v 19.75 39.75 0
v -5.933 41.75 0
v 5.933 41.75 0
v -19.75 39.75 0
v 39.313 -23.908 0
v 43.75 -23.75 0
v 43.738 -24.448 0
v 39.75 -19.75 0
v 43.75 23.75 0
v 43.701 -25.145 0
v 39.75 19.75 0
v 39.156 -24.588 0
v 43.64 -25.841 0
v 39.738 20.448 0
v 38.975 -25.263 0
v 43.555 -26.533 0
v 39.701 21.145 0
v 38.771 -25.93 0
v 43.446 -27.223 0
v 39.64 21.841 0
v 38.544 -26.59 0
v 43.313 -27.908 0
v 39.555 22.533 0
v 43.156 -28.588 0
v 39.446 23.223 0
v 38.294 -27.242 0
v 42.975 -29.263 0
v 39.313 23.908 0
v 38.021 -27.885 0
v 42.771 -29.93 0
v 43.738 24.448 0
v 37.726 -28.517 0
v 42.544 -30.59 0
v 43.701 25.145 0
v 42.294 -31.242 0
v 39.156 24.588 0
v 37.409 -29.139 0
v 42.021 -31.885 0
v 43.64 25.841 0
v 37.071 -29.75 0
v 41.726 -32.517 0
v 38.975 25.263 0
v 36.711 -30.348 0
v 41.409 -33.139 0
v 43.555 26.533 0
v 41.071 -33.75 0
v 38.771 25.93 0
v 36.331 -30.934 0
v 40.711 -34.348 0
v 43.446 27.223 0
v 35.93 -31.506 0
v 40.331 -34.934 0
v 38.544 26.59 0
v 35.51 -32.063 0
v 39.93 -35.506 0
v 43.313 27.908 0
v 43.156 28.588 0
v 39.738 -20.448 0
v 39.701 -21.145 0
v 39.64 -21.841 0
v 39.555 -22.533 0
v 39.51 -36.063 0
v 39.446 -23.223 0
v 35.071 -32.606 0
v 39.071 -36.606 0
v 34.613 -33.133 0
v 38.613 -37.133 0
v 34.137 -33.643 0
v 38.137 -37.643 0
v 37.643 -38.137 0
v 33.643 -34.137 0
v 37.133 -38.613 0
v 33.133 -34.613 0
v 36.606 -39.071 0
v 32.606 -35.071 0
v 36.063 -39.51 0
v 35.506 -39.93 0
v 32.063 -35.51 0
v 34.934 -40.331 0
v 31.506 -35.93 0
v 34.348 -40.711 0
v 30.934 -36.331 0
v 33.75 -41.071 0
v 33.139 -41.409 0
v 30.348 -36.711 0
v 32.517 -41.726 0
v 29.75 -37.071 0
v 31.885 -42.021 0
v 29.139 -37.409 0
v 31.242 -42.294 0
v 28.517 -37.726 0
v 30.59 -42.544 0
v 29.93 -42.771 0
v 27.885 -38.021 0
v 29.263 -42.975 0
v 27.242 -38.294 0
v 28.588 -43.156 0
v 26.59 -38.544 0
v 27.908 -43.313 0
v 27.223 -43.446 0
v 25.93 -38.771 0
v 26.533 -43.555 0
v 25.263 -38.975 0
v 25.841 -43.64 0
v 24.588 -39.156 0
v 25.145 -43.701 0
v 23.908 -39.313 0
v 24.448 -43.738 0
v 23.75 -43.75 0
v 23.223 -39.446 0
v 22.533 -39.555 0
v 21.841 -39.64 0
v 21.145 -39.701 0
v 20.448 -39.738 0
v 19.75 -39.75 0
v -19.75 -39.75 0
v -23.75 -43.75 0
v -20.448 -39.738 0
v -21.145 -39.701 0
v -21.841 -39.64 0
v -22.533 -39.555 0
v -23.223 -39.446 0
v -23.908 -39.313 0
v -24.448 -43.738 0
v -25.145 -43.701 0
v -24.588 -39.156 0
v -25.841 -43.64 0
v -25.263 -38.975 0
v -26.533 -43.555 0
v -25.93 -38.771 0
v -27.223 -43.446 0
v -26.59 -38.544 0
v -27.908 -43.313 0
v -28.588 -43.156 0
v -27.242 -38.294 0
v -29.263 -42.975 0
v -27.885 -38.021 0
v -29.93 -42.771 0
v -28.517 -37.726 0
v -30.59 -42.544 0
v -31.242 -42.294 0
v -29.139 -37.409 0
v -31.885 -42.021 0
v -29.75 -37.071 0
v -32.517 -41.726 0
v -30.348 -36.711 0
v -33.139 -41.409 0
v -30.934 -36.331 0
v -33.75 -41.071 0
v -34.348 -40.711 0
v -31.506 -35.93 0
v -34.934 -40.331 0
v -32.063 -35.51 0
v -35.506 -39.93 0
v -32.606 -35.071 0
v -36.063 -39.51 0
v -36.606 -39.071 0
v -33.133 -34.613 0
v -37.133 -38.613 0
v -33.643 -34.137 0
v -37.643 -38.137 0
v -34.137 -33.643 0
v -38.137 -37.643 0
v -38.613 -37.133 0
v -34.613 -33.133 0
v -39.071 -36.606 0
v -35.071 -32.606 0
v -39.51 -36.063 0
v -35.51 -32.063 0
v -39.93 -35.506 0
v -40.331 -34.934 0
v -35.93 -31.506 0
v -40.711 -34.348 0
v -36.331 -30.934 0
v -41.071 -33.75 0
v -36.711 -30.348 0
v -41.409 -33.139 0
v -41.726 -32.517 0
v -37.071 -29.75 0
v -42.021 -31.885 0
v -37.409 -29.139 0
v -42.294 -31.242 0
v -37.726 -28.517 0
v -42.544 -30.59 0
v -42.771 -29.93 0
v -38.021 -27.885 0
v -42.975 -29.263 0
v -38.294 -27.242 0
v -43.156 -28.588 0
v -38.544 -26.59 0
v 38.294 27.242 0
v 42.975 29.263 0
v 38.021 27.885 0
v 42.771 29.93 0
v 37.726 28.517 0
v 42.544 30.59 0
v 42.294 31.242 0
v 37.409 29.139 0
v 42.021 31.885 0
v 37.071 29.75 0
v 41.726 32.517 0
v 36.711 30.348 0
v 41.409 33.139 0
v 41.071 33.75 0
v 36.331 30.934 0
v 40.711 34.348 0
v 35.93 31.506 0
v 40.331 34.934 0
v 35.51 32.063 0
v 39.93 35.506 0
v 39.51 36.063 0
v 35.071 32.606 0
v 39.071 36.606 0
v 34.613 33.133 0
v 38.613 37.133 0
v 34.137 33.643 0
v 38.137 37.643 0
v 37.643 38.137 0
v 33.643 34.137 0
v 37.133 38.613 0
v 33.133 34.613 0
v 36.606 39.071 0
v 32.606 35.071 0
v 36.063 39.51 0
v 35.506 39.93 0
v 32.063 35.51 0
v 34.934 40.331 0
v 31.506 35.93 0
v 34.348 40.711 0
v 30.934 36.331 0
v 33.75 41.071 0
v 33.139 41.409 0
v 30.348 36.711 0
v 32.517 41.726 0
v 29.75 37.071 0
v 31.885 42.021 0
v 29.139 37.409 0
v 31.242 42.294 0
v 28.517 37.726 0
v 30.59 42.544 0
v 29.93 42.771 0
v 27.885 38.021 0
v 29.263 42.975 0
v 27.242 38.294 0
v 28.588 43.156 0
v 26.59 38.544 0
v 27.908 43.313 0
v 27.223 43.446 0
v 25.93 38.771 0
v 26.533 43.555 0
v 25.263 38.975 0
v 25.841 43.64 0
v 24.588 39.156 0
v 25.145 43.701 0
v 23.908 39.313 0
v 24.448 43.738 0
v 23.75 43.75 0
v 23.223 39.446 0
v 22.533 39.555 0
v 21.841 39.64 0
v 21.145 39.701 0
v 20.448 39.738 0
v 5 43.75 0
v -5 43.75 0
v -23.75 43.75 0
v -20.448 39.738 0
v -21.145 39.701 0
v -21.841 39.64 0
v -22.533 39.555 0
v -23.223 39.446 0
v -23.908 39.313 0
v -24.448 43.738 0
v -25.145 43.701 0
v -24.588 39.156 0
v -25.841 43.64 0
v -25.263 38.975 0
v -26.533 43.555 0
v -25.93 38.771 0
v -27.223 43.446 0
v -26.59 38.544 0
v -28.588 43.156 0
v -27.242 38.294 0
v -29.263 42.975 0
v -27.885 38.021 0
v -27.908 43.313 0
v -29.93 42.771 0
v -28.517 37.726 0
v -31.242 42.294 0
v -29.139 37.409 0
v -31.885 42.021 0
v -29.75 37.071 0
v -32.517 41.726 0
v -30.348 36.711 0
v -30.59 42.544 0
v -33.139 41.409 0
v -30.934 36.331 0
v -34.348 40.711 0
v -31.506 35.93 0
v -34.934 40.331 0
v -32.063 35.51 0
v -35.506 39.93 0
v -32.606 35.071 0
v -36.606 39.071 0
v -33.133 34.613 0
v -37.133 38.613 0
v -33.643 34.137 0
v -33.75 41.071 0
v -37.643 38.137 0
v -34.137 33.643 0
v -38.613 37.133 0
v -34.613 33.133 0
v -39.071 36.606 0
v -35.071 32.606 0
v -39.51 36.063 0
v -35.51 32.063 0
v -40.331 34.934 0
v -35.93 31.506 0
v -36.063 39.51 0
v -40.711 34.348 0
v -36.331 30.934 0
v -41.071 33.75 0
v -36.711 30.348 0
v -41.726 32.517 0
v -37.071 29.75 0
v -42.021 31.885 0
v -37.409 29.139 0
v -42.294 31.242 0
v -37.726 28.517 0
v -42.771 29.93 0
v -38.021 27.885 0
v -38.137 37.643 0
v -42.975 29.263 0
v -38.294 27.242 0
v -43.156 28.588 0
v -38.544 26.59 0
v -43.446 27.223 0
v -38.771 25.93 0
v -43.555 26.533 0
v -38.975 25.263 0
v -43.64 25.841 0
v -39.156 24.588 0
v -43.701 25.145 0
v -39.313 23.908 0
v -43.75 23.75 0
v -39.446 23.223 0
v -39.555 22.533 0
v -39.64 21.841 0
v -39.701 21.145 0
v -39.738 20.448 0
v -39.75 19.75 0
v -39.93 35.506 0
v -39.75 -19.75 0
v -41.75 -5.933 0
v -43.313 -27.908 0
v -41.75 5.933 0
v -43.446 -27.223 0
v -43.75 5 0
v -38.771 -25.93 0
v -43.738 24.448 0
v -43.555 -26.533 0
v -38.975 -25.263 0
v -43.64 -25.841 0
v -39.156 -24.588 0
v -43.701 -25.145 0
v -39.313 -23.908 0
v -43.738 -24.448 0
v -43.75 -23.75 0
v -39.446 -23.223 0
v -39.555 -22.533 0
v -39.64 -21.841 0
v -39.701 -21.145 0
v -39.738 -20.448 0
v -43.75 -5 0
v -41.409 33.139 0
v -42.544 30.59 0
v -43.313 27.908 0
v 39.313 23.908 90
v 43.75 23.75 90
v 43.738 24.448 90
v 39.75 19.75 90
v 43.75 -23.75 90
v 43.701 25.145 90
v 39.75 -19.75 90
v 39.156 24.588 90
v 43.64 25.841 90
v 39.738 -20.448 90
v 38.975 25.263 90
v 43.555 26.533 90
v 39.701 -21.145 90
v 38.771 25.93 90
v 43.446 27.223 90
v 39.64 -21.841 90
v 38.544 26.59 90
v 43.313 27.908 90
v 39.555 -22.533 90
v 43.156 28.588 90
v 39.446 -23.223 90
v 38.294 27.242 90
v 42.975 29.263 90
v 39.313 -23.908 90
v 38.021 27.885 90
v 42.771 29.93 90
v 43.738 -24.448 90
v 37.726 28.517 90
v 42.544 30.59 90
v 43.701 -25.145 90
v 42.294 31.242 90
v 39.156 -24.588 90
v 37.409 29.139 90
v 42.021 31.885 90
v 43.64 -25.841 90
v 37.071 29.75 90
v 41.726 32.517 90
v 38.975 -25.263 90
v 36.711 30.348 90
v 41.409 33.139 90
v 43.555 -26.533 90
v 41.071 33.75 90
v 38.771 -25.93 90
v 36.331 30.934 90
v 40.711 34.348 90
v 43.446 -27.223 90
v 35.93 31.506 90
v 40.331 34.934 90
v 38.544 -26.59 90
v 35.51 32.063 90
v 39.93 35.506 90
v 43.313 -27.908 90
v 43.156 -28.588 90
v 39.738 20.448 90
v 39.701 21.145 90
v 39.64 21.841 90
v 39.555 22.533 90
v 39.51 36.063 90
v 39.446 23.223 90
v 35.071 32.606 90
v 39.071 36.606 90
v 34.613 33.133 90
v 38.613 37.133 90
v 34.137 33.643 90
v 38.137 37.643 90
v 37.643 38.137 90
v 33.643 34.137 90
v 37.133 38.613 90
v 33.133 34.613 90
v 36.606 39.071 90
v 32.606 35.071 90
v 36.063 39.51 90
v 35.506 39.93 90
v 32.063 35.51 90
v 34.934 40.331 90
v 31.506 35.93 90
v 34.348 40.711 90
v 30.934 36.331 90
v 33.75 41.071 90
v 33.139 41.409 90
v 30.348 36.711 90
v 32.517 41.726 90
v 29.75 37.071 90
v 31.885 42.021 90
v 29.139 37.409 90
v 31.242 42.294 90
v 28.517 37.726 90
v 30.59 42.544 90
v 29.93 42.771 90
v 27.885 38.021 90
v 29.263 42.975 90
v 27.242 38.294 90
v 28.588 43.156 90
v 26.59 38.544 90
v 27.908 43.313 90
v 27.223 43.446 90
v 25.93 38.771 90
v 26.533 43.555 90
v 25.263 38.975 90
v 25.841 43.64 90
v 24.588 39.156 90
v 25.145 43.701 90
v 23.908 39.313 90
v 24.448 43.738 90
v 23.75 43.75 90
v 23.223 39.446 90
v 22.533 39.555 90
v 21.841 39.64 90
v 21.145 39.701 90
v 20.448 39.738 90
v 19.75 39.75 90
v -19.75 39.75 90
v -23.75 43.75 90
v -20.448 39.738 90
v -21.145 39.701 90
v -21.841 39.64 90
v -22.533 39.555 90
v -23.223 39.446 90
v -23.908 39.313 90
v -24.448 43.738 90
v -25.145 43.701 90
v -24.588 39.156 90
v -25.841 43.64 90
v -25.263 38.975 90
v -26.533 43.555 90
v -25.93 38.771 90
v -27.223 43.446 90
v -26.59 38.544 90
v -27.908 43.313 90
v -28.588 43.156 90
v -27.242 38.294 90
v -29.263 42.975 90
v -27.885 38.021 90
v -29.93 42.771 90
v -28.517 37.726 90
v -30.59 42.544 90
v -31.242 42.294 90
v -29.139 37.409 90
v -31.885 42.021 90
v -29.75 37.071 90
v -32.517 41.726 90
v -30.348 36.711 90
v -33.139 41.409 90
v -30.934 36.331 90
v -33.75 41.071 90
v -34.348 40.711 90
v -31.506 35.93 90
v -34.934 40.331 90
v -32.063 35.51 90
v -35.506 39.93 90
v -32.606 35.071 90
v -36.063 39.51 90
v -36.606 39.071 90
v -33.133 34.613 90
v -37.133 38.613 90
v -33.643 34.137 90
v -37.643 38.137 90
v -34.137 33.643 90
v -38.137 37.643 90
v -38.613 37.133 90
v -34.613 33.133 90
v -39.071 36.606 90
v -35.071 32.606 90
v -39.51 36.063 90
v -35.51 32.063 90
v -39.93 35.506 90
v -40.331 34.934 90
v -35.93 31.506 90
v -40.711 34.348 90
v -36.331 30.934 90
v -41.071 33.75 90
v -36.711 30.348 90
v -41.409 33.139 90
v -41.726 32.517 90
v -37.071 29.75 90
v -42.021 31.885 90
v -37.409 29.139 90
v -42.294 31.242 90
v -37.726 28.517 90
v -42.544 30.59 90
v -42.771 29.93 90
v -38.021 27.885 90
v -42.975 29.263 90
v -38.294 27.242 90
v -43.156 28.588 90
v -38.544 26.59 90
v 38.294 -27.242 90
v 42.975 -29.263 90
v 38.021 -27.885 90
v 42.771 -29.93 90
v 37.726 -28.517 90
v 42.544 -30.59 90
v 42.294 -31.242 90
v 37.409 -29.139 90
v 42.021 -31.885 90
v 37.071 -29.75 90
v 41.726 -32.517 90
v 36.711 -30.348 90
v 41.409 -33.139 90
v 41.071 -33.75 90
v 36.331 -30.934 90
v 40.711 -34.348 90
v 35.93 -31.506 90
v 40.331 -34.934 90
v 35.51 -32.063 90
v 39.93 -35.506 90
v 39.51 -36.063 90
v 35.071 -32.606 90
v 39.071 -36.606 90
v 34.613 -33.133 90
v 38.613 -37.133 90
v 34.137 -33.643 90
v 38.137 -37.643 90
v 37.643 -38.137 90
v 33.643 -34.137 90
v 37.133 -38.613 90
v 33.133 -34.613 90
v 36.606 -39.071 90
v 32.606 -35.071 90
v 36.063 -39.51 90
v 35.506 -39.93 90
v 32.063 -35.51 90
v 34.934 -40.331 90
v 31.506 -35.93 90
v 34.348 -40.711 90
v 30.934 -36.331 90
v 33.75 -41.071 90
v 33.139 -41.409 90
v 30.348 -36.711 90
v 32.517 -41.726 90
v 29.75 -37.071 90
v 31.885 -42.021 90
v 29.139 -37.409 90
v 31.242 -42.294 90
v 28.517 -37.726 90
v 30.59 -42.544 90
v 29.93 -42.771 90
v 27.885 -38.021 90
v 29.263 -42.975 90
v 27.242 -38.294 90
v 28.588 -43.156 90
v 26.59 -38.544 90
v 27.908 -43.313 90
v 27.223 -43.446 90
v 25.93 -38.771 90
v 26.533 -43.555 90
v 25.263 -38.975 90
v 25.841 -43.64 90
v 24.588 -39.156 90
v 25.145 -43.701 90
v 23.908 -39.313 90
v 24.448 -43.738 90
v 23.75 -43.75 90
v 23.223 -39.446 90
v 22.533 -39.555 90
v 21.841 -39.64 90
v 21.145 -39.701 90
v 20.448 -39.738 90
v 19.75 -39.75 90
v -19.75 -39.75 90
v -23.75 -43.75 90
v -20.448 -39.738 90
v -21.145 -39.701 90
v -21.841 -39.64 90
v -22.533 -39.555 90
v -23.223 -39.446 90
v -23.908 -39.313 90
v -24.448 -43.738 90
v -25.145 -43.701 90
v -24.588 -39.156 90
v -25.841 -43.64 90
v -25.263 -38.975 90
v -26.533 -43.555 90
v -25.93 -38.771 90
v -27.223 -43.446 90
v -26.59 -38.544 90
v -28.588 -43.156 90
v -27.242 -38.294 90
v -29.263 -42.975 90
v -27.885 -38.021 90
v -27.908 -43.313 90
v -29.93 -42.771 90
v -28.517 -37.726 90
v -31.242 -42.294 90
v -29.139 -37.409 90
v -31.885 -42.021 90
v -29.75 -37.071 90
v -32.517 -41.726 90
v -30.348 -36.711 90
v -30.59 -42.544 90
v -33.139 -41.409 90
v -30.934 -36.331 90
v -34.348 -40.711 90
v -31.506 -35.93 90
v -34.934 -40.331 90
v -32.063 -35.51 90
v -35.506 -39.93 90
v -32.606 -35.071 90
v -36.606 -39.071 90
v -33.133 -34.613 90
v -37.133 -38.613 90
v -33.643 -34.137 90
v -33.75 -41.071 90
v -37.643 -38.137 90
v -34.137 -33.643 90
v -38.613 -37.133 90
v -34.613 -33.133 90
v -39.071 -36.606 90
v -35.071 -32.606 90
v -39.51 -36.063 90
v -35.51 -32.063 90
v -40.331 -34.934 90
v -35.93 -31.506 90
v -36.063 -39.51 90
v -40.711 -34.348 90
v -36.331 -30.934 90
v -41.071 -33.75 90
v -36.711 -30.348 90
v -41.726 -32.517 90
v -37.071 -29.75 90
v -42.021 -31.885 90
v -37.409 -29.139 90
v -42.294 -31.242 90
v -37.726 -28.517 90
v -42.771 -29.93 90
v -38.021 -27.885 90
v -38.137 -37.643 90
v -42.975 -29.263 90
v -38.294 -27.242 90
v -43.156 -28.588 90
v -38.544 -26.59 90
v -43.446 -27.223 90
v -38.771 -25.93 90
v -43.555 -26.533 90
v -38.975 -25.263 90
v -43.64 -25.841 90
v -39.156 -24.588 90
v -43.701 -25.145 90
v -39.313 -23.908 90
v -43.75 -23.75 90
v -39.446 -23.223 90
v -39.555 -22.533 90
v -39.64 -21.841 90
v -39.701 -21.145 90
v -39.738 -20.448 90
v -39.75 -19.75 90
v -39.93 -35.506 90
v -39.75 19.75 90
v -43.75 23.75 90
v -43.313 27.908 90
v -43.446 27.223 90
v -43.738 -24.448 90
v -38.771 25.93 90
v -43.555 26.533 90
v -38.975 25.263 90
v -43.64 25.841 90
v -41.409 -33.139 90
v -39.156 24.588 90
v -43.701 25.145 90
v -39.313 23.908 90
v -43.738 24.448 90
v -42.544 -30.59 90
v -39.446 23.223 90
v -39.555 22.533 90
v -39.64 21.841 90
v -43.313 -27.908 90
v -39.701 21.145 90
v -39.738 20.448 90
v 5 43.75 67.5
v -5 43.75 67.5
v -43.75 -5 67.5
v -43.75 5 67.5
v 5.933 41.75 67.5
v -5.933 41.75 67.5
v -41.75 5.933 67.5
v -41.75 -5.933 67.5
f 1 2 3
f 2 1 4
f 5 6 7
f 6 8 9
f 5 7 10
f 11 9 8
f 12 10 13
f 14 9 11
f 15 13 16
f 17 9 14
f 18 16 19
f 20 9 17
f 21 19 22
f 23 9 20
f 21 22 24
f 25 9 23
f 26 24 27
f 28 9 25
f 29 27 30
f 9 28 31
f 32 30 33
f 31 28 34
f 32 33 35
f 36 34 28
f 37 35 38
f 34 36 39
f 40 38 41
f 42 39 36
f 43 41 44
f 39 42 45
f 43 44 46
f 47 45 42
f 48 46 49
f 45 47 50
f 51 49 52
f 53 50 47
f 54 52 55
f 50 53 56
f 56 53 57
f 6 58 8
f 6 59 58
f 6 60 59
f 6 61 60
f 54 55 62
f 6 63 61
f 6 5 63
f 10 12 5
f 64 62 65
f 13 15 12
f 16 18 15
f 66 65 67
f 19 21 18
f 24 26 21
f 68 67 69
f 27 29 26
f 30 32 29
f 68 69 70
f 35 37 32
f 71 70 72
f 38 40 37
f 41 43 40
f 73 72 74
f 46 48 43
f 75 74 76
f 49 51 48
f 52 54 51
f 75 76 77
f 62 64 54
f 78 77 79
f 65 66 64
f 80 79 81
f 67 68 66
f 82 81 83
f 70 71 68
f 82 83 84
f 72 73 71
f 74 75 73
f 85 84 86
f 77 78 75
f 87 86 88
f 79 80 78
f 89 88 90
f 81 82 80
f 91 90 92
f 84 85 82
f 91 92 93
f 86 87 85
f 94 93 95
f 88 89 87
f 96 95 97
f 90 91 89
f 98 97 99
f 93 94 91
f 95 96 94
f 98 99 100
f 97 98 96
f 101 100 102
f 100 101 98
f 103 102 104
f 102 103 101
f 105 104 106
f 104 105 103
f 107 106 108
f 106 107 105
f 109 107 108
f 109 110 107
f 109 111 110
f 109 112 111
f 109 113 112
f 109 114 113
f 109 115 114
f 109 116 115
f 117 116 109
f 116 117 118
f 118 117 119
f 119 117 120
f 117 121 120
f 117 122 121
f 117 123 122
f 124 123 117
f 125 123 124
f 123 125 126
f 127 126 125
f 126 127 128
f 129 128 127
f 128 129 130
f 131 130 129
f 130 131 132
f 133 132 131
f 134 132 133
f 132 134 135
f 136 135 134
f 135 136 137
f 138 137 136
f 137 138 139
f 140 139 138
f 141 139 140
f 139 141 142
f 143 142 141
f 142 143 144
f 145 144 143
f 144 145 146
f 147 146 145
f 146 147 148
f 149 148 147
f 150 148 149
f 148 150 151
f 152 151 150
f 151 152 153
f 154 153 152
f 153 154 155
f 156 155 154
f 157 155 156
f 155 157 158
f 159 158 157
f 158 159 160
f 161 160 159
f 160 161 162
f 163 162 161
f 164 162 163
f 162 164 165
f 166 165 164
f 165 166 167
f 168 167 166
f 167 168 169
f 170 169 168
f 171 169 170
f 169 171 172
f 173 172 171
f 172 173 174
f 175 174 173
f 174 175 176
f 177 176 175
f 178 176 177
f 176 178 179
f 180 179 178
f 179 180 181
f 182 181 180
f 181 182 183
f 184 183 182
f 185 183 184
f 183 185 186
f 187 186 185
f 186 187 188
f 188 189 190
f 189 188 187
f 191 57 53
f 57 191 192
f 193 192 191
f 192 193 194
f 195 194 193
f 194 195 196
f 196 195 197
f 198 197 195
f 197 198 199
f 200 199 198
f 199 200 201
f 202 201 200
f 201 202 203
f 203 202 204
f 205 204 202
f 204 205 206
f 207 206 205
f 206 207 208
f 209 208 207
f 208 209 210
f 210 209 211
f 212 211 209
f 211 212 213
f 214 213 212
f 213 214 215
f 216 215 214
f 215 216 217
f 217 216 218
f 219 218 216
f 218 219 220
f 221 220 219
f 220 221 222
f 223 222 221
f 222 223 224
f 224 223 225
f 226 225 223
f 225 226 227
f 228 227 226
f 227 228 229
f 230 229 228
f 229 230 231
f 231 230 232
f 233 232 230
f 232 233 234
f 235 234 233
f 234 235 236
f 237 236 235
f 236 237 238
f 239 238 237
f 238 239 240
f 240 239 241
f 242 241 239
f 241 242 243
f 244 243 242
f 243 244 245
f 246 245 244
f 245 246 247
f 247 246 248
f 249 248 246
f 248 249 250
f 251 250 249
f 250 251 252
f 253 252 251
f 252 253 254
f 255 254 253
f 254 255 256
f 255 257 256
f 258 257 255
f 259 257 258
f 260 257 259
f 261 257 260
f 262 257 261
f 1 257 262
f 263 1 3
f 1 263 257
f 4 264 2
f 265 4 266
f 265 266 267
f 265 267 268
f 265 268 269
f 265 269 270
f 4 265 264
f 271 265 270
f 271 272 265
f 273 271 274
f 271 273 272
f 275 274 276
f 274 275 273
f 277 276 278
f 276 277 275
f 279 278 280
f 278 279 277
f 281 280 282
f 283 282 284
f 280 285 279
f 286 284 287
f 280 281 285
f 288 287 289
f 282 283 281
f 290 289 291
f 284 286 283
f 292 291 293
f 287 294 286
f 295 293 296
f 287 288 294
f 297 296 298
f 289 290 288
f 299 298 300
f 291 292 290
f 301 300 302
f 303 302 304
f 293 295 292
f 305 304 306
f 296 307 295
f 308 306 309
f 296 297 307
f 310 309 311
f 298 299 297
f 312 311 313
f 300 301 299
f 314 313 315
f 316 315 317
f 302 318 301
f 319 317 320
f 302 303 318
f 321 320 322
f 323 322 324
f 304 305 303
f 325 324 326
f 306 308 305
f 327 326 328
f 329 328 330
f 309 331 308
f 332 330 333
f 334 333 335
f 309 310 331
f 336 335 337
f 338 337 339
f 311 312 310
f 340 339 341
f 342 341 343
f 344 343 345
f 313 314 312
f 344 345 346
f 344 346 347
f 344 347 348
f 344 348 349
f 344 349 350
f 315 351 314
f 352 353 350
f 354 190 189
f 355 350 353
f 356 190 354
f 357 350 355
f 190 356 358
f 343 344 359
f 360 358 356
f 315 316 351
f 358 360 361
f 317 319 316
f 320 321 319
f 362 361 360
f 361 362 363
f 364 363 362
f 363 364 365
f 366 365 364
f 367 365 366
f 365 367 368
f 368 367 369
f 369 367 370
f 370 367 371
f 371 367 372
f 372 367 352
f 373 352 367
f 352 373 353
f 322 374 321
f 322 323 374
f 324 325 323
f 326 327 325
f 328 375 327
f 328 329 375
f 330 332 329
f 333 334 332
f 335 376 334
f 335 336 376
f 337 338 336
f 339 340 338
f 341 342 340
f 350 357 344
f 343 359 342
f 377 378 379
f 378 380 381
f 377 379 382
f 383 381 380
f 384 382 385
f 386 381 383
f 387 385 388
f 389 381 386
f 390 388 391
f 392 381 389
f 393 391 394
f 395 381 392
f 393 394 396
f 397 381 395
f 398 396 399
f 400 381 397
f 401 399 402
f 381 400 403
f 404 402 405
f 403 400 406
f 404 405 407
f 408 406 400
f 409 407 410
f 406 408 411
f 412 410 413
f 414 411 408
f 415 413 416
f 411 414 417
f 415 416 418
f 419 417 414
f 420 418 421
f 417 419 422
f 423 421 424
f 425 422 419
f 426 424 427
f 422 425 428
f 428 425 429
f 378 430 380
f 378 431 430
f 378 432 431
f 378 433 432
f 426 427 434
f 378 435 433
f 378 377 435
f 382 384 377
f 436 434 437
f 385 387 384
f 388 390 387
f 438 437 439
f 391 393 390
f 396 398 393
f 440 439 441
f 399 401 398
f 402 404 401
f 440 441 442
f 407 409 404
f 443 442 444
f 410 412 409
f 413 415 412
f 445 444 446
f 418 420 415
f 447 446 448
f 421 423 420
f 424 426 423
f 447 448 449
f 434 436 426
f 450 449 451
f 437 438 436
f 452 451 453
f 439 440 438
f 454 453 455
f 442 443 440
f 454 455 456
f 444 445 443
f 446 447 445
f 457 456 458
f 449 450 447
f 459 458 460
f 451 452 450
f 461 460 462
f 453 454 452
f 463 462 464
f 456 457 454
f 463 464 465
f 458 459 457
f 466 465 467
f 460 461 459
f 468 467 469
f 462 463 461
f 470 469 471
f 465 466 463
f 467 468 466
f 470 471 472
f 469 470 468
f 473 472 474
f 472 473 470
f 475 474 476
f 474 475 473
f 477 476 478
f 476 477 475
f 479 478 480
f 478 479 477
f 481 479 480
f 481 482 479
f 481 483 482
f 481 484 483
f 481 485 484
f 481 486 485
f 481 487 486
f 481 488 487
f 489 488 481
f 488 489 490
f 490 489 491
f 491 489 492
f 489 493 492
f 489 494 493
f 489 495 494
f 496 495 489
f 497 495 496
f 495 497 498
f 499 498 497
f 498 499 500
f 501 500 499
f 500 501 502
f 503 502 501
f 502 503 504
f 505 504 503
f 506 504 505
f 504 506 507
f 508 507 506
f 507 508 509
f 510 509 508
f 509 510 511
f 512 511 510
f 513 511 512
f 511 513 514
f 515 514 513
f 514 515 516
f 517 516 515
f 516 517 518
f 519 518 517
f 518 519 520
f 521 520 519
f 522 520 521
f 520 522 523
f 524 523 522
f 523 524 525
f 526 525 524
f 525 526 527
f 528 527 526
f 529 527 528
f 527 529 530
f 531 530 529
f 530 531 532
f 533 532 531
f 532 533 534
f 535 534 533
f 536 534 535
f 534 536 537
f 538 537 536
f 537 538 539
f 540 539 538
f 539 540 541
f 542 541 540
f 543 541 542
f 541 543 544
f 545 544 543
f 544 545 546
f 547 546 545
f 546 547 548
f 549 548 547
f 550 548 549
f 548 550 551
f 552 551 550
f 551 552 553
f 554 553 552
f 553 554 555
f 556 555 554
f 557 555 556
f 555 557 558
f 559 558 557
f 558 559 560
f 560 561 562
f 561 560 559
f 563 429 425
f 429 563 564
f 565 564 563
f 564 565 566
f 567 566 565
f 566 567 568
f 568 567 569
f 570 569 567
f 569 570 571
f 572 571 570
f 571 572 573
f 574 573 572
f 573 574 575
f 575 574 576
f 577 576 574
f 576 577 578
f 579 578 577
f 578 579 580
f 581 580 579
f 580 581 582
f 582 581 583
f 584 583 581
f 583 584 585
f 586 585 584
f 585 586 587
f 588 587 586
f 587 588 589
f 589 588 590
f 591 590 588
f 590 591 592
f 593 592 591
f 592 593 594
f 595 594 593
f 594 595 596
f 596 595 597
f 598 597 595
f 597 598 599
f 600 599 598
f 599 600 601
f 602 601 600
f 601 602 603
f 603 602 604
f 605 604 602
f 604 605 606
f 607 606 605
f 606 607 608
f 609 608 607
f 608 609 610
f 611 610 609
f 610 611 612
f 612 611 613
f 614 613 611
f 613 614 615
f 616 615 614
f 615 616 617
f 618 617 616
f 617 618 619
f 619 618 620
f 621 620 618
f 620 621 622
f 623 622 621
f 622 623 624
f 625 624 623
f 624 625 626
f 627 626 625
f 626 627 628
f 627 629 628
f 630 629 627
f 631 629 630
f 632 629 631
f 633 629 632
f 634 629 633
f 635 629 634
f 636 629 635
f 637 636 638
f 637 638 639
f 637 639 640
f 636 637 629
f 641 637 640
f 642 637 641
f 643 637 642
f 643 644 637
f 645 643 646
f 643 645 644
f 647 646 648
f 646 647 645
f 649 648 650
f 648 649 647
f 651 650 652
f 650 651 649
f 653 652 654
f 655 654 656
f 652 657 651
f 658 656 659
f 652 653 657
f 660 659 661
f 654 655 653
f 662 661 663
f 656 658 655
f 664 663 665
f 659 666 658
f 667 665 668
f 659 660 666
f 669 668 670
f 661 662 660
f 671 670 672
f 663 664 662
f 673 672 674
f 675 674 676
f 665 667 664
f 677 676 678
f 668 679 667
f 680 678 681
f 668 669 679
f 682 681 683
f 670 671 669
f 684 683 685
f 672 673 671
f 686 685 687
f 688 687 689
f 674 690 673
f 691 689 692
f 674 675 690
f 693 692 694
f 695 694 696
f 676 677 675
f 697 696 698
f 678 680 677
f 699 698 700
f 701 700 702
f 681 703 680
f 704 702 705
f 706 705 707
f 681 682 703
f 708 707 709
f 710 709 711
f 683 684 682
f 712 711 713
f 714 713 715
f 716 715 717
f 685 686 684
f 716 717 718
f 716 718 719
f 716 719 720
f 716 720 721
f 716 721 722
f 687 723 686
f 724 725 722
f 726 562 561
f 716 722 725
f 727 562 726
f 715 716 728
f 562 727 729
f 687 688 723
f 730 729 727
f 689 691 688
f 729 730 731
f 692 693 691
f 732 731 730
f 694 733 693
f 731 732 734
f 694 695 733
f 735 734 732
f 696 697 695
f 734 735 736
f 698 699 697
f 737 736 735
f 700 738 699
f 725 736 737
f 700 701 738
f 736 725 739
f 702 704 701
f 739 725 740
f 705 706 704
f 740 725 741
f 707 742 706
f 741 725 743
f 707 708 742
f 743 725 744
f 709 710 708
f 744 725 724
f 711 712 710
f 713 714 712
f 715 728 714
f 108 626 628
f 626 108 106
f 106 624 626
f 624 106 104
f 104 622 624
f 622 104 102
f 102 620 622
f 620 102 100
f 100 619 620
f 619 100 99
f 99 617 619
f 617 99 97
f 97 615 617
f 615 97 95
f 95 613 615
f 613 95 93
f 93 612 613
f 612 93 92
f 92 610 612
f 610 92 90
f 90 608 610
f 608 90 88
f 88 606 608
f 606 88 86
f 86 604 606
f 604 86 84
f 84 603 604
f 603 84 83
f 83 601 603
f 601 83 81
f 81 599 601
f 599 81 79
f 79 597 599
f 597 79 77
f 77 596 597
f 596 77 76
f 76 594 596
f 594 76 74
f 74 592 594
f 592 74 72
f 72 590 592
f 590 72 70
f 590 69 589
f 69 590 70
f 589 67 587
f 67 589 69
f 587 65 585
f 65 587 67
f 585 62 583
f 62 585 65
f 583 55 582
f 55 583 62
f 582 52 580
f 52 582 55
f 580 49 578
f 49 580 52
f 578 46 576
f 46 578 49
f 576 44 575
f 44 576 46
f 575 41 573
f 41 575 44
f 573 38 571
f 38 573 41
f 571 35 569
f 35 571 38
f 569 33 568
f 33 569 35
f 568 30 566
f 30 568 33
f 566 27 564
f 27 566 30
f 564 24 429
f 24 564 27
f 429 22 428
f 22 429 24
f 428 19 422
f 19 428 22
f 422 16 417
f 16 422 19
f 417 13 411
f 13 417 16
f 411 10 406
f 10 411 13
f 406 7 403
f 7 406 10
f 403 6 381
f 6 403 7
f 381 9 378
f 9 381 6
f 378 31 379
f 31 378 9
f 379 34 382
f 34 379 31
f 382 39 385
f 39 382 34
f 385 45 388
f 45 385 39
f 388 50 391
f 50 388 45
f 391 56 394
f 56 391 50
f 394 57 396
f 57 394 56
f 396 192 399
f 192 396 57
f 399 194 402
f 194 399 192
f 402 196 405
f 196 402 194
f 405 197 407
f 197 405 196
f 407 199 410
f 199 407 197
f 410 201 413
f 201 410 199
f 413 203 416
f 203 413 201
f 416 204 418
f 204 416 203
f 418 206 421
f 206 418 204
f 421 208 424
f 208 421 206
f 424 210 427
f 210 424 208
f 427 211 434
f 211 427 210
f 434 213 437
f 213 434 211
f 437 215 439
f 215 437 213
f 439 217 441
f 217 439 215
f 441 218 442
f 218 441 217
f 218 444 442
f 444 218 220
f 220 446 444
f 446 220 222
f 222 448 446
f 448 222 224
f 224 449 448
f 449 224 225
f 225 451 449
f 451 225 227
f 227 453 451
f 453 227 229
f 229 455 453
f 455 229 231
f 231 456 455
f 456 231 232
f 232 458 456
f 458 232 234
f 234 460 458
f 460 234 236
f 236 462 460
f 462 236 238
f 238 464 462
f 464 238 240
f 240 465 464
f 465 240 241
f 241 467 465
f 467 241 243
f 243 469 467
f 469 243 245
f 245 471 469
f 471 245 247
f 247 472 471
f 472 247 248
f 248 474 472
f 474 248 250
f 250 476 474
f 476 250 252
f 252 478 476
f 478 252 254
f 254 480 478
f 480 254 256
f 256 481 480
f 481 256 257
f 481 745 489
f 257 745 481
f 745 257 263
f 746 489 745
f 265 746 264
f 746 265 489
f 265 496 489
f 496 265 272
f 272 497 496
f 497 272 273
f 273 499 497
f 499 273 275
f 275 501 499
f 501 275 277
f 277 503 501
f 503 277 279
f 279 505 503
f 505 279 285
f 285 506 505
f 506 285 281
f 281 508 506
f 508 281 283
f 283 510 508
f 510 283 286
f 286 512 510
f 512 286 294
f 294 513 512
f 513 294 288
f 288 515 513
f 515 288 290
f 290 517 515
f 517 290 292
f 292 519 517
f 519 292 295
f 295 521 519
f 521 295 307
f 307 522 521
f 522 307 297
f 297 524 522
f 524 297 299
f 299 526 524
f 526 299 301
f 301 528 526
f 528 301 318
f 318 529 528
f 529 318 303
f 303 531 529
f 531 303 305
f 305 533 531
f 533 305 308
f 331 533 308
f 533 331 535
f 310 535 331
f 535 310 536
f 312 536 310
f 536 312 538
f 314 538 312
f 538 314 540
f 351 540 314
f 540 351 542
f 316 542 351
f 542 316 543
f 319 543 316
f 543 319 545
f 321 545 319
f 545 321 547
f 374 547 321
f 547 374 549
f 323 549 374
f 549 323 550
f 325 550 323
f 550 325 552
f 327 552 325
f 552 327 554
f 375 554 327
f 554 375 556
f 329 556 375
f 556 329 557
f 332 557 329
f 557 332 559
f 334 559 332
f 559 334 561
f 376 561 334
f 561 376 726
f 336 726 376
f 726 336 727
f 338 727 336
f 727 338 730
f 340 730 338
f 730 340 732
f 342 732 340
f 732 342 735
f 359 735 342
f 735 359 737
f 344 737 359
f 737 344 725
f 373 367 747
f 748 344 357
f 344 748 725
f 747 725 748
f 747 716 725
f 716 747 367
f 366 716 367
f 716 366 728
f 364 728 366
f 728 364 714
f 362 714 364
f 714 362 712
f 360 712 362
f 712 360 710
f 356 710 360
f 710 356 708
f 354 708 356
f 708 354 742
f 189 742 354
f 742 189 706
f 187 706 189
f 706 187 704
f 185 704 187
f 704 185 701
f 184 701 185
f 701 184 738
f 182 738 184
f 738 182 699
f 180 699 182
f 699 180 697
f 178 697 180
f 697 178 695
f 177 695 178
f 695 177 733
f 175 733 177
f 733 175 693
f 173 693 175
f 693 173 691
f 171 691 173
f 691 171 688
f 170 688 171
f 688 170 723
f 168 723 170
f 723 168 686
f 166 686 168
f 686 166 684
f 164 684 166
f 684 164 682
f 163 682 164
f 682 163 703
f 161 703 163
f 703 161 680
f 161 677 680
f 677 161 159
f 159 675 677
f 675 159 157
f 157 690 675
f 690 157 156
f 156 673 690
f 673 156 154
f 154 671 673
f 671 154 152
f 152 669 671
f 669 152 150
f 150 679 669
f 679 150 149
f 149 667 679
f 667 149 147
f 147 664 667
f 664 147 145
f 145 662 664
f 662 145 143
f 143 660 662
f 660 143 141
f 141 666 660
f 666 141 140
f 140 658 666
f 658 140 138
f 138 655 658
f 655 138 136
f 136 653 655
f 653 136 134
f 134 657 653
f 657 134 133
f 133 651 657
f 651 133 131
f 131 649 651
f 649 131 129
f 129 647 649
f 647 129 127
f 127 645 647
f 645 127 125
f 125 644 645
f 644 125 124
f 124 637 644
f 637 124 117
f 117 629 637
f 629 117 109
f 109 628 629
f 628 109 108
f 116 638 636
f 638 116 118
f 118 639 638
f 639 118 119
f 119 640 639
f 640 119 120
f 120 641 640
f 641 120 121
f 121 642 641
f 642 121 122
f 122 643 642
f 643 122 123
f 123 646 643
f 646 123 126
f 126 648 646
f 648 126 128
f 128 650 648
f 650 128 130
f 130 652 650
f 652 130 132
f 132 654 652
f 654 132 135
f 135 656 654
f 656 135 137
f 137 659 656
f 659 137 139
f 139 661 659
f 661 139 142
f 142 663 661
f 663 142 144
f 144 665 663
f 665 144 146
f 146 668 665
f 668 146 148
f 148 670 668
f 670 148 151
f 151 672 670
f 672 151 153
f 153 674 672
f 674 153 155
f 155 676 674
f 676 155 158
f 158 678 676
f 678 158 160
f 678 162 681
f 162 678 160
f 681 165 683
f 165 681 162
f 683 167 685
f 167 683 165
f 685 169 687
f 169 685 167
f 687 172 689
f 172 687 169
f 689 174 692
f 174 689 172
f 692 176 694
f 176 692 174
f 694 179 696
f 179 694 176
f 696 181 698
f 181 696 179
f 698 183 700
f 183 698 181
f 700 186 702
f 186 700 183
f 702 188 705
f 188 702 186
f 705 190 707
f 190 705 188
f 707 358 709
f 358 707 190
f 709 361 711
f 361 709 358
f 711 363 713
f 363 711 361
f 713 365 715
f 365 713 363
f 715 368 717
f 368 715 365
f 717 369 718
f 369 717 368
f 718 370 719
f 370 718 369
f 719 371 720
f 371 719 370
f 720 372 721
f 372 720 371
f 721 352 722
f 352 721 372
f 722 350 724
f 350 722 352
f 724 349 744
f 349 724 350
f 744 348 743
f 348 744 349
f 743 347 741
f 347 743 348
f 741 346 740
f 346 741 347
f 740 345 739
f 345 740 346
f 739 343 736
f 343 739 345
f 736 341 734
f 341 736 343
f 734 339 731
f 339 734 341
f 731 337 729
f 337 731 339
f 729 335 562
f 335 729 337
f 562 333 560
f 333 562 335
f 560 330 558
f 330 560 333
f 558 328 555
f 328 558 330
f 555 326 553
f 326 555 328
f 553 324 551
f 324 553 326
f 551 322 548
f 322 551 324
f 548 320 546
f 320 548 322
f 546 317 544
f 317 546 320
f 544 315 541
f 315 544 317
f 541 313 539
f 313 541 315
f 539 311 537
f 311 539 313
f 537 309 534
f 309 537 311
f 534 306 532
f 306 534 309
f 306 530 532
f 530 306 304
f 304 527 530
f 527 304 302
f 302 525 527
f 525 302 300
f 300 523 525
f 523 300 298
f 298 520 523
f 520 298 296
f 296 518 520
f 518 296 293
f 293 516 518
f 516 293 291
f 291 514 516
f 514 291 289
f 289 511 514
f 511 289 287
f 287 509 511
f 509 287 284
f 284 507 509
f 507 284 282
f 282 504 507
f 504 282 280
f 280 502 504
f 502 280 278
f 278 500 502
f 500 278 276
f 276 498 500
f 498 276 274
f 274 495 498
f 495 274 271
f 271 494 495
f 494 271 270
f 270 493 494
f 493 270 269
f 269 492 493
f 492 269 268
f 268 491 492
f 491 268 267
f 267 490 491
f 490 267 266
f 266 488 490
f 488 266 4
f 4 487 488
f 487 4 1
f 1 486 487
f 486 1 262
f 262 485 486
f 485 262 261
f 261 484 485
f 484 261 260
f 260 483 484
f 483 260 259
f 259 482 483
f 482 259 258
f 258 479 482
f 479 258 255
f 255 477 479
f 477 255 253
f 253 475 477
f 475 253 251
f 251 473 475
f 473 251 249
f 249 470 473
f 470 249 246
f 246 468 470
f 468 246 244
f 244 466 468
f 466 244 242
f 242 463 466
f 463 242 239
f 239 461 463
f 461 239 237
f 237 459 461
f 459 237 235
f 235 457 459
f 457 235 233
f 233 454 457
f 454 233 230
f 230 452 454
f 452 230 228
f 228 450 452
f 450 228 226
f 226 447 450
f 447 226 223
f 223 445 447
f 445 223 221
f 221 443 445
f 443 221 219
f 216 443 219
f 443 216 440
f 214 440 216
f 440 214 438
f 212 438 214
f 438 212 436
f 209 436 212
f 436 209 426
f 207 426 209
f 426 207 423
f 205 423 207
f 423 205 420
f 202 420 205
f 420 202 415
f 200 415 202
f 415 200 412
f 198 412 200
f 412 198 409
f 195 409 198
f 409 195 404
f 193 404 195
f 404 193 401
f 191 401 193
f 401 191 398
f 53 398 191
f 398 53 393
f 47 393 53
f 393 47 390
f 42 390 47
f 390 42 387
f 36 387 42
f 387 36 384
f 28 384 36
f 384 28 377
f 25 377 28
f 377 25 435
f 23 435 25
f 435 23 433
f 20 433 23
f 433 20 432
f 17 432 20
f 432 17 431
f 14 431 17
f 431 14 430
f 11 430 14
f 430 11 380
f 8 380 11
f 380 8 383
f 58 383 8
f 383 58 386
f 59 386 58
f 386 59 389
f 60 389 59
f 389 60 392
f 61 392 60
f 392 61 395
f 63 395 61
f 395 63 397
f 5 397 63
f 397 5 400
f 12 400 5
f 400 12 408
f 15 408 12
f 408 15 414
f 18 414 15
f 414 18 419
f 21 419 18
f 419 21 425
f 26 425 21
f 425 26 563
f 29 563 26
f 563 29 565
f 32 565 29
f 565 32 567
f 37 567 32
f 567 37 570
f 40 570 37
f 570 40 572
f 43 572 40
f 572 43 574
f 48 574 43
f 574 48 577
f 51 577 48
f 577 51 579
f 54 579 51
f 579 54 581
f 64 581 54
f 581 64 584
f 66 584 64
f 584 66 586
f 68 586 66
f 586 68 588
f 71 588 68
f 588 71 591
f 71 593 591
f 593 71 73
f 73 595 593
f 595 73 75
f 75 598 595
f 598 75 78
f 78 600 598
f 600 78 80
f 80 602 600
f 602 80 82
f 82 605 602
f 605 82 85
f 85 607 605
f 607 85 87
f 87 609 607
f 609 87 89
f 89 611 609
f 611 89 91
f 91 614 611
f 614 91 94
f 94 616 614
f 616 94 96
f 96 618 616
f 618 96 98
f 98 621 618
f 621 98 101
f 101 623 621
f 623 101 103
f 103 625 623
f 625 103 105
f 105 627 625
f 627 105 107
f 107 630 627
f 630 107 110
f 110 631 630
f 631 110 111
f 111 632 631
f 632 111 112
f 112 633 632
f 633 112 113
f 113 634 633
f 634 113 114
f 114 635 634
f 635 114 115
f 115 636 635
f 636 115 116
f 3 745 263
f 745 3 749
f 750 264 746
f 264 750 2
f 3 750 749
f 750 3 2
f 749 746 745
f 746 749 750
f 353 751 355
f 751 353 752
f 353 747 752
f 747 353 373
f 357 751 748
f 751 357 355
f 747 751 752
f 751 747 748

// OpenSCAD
// Modular Shelf Unit with Track-and-Strip Connector System
// A hollow cuboid with open front and back faces, rounded edges along the depth axis.
// Dovetail tracks on outer walls allow connector strips to mechanically join shelf pieces.
// Units: millimeters

// --- Shelf Parameters ---
//width  = 175;  // left to right
//height = 175;  // top to bottom
width  = 87.5;  // left to right
height = 87.5;  // top to bottom
depth  = 90;  // front to back (the open axis)
wall   = 4;    // wall thickness
radius = 20;   // corner rounding radius (same for inner and outer edges)

// --- Track Parameters ---
track_width      = 10;   // width of groove at wall surface (narrow opening)
track_depth      = 2;    // how deep each groove cuts into the wall
track_length_pct = 75;   // percentage of depth covered, starting from back
dovetail_angle   = 25;   // degrees from vertical — widens groove deeper in wall

// --- Number of tracks per wall (0 = no tracks on that wall) ---
// Tracks are evenly spaced along the wall length.
// e.g., tracks_top = 2 on a 250mm wide shelf places tracks at 62.5mm and 187.5mm
tracks_top    = 1;
tracks_bottom = 0;
tracks_left   = 1;
tracks_right  = 0;

$fn = 180;

track_length = depth * track_length_pct / 100;
dovetail_extra = track_depth * tan(dovetail_angle);

// A centered rounded rectangle in 2D
module rounded_rect(w, h, r) {
    offset(r = r)
        square([w - 2 * r, h - 2 * r], center = true);
}

// Shelf body: hollow rounded-rect profile extruded along depth
module shelf_body(w, h, d, wall, r) {
    linear_extrude(height = d)
        difference() {
            rounded_rect(w, h, r);
            rounded_rect(w - 2 * wall, h - 2 * wall, r);
        }
}

// Dovetail tracks along a horizontal wall (top or bottom)
// inward_dir: -1 for top wall (groove goes toward -y), +1 for bottom wall (toward +y)
module horizontal_tracks(count, wall_width, wall_y, inward_dir) {
    if (count > 0) {
        segment = wall_width / count;
        for (i = [0 : count - 1]) {
            x_pos = -wall_width / 2 + segment * (i + 0.5);
            linear_extrude(height = track_length)
                polygon([
                    [x_pos - track_width / 2,                  wall_y],
                    [x_pos + track_width / 2,                  wall_y],
                    [x_pos + track_width / 2 + dovetail_extra, wall_y + inward_dir * track_depth],
                    [x_pos - track_width / 2 - dovetail_extra, wall_y + inward_dir * track_depth]
                ]);
        }
    }
}

// Dovetail tracks along a vertical wall (left or right)
// inward_dir: -1 for right wall (groove goes toward -x), +1 for left wall (toward +x)
module vertical_tracks(count, wall_height, wall_x, inward_dir) {
    if (count > 0) {
        segment = wall_height / count;
        for (i = [0 : count - 1]) {
            y_pos = -wall_height / 2 + segment * (i + 0.5);
            linear_extrude(height = track_length)
                polygon([
                    [wall_x,                        y_pos - track_width / 2],
                    [wall_x,                        y_pos + track_width / 2],
                    [wall_x + inward_dir * track_depth, y_pos + track_width / 2 + dovetail_extra],
                    [wall_x + inward_dir * track_depth, y_pos - track_width / 2 - dovetail_extra]
                ]);
        }
    }
}

// Shelf with dovetail track grooves subtracted
module shelf() {
    difference() {
        shelf_body(width, height, depth, wall, radius);

        // Top wall tracks (spaced along width)
        horizontal_tracks(tracks_top, width, height / 2, -1);

        // Bottom wall tracks (spaced along width)
        horizontal_tracks(tracks_bottom, width, -height / 2, 1);

        // Right wall tracks (spaced along height)
        vertical_tracks(tracks_right, height, width / 2, -1);

        // Left wall tracks (spaced along height)
        vertical_tracks(tracks_left, height, -width / 2, 1);
    }
}

shelf();
